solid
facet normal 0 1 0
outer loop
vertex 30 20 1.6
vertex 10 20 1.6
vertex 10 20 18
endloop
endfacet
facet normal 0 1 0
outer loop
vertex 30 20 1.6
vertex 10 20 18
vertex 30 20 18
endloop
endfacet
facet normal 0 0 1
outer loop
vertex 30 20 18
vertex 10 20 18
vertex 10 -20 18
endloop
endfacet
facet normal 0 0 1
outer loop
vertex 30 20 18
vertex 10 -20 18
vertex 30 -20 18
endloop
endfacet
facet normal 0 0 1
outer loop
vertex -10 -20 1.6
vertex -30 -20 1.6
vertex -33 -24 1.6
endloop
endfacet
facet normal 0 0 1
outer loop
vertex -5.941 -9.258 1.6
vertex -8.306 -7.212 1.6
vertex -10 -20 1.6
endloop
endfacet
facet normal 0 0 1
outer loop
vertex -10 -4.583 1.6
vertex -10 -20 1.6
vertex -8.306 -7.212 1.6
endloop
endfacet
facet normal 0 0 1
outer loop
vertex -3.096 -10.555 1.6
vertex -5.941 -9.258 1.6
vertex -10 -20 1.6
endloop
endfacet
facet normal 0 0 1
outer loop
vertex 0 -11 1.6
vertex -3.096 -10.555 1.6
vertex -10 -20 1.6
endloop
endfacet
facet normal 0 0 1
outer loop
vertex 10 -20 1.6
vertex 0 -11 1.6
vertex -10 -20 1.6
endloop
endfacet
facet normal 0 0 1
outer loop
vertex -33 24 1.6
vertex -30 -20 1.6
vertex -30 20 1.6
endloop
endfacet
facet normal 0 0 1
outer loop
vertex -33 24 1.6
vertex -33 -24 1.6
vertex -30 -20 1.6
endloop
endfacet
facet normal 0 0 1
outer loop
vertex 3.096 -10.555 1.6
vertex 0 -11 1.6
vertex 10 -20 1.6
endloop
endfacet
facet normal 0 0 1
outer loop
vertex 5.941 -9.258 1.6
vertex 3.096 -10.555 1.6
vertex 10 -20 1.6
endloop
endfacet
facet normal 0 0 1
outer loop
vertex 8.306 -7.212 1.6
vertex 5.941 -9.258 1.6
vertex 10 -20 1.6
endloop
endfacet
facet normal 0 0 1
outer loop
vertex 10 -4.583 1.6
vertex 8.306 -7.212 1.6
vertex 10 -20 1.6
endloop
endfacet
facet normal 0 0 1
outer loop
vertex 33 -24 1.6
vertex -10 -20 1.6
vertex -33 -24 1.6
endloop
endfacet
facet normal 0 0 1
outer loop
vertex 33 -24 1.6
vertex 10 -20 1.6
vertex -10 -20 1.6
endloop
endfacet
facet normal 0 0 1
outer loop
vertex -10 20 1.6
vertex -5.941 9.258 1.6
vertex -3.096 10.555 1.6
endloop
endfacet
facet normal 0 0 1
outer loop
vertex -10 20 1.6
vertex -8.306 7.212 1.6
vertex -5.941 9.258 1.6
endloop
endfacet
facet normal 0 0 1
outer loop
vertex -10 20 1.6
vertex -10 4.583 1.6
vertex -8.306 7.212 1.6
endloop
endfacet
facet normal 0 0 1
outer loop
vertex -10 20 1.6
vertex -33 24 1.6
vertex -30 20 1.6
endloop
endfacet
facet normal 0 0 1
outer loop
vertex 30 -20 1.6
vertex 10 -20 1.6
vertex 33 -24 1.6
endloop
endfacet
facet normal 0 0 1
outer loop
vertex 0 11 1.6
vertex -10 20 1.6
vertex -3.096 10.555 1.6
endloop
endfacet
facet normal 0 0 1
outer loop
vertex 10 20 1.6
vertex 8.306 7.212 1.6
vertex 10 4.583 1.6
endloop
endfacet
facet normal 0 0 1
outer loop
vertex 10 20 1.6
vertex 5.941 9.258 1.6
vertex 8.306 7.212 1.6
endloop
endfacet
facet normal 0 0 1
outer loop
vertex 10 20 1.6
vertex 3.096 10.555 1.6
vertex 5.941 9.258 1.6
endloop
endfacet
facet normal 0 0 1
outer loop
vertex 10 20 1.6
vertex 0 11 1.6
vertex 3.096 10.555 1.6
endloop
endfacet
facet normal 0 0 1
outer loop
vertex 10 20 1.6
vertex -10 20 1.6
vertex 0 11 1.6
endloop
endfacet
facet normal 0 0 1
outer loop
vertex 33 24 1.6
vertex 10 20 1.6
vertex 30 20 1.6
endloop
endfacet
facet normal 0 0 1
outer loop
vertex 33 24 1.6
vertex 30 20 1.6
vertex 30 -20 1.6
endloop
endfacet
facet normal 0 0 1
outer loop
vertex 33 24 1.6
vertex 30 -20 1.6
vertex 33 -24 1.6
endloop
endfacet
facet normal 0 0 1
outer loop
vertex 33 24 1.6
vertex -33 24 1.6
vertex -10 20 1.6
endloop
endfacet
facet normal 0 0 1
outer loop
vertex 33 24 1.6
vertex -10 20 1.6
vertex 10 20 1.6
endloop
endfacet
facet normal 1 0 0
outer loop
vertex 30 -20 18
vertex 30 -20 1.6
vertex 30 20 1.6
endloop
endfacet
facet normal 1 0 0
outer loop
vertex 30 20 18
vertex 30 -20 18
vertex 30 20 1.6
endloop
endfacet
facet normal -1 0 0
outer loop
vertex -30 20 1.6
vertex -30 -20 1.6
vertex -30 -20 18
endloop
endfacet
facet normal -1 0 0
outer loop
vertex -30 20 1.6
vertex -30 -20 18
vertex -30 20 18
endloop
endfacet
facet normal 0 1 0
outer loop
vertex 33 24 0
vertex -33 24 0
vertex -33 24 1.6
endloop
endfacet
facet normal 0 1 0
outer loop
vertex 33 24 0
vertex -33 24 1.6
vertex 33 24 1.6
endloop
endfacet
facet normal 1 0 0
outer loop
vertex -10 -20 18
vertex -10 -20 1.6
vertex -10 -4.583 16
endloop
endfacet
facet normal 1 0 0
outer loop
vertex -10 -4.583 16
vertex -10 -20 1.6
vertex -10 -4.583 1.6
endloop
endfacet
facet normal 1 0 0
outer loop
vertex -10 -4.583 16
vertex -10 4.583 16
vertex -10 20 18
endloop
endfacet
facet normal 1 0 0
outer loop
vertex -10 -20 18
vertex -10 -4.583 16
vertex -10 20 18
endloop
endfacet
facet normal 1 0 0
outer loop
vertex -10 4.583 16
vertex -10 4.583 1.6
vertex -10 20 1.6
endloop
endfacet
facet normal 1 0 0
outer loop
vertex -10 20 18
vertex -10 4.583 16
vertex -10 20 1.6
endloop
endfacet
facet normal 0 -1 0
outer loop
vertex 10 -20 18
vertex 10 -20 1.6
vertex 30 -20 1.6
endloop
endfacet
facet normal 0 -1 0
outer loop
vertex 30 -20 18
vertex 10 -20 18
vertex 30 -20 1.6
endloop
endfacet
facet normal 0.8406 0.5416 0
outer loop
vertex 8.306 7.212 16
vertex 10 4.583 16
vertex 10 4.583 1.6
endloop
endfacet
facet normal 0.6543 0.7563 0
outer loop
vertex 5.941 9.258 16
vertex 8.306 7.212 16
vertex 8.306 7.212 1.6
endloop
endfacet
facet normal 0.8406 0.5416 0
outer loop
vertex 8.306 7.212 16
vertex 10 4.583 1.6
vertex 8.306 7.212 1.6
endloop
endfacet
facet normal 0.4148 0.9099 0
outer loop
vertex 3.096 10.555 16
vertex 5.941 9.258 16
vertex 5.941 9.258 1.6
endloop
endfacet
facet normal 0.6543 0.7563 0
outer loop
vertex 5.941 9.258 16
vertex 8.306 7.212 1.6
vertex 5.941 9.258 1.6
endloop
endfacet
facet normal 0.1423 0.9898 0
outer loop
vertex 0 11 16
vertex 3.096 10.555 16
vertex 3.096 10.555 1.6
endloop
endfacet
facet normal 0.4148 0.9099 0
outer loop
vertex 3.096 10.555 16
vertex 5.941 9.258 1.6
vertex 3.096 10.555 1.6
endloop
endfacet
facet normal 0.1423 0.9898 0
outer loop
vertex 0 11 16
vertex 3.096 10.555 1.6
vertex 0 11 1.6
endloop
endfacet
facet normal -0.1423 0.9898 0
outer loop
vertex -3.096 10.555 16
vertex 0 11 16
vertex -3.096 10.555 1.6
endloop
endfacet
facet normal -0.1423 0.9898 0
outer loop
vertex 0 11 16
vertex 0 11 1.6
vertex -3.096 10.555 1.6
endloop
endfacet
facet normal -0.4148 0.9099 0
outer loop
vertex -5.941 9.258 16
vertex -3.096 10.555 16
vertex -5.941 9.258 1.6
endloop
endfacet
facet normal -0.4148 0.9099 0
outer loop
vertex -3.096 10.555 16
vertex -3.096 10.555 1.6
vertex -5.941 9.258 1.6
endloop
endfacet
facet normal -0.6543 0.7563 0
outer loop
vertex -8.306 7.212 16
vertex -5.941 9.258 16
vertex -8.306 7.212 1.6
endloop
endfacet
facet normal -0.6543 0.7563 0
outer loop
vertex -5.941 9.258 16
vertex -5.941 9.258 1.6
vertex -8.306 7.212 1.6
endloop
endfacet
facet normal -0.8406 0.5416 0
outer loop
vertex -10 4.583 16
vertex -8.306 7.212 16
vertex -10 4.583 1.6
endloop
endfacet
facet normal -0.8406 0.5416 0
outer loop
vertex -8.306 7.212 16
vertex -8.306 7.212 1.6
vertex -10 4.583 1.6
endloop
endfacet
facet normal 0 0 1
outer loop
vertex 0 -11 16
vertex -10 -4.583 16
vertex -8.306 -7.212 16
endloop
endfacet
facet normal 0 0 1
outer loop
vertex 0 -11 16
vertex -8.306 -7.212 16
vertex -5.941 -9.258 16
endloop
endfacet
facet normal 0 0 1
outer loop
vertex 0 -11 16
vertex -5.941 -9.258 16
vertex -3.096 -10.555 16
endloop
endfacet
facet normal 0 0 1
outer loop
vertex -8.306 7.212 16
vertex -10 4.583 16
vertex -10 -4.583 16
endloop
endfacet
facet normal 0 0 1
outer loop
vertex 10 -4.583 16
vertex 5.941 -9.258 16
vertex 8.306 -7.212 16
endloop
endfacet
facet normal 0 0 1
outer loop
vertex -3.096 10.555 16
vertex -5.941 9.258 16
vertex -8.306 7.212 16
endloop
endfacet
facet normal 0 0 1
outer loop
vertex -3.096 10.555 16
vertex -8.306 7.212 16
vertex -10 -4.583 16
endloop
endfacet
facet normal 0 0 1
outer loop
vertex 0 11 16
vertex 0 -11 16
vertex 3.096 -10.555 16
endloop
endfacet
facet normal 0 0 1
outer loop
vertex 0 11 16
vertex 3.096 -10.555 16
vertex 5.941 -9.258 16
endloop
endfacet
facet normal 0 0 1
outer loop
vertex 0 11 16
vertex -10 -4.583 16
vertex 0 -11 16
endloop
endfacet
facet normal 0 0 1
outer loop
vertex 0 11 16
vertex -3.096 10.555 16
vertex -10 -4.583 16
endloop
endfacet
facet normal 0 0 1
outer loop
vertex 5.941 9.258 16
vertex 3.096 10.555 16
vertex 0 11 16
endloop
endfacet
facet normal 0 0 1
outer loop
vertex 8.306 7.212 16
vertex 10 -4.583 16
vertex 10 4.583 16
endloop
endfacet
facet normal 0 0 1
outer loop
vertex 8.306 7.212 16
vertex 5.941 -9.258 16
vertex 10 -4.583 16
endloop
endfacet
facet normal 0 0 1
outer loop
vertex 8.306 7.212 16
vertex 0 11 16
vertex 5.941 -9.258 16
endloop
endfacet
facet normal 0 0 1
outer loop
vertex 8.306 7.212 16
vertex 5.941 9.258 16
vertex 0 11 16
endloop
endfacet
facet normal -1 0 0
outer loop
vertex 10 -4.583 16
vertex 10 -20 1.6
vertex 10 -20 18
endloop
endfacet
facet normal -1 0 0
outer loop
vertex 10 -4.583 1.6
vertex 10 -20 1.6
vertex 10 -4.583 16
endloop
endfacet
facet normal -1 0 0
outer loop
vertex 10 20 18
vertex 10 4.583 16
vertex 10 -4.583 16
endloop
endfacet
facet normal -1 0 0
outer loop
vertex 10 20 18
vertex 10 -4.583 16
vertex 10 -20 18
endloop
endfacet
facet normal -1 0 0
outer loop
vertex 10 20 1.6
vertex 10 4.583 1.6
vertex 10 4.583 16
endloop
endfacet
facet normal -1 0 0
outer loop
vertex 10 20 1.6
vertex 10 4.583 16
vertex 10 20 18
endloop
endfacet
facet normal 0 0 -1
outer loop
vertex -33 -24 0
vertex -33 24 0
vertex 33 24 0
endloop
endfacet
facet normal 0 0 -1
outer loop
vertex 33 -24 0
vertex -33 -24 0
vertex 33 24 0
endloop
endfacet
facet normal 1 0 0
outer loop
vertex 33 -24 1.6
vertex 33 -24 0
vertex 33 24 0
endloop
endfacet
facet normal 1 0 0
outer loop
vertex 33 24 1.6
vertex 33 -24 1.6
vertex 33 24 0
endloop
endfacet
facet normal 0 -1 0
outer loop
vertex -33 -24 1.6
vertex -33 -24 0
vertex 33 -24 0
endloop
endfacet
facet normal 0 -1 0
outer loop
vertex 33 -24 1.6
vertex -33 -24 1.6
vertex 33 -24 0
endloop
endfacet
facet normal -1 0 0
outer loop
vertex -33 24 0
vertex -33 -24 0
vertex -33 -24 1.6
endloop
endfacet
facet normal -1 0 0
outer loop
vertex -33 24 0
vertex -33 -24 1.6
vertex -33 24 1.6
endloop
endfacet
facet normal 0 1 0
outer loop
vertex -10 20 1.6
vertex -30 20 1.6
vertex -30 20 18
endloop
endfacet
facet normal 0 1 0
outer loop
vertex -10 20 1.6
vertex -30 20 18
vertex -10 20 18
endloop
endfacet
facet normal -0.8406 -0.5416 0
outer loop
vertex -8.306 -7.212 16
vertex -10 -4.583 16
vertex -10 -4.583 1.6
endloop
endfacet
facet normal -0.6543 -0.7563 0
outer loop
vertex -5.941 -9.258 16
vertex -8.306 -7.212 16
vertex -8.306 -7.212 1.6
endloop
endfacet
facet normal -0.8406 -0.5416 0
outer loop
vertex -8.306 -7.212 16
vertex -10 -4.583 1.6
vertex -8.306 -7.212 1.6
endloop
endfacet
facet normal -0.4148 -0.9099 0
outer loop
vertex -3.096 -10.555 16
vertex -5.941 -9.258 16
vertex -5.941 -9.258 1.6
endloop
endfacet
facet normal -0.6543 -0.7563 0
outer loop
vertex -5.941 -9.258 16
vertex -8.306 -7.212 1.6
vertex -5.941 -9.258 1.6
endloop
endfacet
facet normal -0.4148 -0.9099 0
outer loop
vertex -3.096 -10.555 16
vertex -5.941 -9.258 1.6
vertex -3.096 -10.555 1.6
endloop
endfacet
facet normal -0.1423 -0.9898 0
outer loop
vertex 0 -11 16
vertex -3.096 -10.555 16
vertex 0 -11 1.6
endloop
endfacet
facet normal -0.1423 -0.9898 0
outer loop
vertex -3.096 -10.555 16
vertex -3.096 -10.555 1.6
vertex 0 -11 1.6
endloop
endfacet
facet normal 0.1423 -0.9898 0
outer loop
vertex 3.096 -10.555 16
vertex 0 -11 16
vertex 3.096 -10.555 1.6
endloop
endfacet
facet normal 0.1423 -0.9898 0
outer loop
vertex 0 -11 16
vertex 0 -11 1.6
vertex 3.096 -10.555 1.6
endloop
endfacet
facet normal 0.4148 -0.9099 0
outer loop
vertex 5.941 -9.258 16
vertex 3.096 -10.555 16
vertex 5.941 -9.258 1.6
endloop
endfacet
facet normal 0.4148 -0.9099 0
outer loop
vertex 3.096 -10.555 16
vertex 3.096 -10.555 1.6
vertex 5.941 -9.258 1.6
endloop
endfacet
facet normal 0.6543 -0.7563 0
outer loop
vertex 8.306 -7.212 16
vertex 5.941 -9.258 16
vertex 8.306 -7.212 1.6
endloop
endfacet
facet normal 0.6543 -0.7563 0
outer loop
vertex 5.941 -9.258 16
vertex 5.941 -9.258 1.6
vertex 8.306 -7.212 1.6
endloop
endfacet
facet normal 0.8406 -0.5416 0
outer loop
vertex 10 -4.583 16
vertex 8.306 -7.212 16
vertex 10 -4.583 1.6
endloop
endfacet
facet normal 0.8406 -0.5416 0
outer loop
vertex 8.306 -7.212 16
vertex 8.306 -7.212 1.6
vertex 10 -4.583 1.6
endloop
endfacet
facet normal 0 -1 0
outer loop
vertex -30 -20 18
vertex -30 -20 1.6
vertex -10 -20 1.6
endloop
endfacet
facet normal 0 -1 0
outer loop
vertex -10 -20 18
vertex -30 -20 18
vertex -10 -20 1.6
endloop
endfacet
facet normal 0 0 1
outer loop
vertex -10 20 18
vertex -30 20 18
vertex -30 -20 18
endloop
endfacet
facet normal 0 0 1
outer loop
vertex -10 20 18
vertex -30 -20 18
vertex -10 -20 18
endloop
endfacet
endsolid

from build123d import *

# Parameters (mm, degrees)
SKETCH1_W          = 66
SKETCH1_H          = 48
PCB_DEPTH          = 1.6
SKETCH2_W          = 20
SKETCH2_H          = 40
HEATSINK_IN_DEPTH  = 16.4
SKETCH3_W          = 20
SKETCH3_H          = 40
HEATSINK_OUT_DEPTH = 16.4
SKETCH4_R          = 11
INDUCTOR_DEPTH     = 14.4


with BuildPart() as part:
    # Sketch1 → PCB (new body)
    with BuildSketch(Plane.XY):
        Rectangle(SKETCH1_W, SKETCH1_H)
    extrude(amount=PCB_DEPTH)

    # Sketch2 → Heatsink_in (add)
    with BuildSketch(Plane.XY.offset(1.6)):
        with Locations((-20, 0)):
            Rectangle(SKETCH2_W, SKETCH2_H)
    extrude(amount=HEATSINK_IN_DEPTH)

    # Sketch3 → Heatsink_out (add)
    with BuildSketch(Plane.XY.offset(1.6)):
        with Locations((20, 0)):
            Rectangle(SKETCH3_W, SKETCH3_H)
    extrude(amount=HEATSINK_OUT_DEPTH)

    # Sketch4 → Inductor (add)
    with BuildSketch(Plane.XY.offset(1.6)):
        Circle(SKETCH4_R)
    extrude(amount=INDUCTOR_DEPTH)


solid = part.part
